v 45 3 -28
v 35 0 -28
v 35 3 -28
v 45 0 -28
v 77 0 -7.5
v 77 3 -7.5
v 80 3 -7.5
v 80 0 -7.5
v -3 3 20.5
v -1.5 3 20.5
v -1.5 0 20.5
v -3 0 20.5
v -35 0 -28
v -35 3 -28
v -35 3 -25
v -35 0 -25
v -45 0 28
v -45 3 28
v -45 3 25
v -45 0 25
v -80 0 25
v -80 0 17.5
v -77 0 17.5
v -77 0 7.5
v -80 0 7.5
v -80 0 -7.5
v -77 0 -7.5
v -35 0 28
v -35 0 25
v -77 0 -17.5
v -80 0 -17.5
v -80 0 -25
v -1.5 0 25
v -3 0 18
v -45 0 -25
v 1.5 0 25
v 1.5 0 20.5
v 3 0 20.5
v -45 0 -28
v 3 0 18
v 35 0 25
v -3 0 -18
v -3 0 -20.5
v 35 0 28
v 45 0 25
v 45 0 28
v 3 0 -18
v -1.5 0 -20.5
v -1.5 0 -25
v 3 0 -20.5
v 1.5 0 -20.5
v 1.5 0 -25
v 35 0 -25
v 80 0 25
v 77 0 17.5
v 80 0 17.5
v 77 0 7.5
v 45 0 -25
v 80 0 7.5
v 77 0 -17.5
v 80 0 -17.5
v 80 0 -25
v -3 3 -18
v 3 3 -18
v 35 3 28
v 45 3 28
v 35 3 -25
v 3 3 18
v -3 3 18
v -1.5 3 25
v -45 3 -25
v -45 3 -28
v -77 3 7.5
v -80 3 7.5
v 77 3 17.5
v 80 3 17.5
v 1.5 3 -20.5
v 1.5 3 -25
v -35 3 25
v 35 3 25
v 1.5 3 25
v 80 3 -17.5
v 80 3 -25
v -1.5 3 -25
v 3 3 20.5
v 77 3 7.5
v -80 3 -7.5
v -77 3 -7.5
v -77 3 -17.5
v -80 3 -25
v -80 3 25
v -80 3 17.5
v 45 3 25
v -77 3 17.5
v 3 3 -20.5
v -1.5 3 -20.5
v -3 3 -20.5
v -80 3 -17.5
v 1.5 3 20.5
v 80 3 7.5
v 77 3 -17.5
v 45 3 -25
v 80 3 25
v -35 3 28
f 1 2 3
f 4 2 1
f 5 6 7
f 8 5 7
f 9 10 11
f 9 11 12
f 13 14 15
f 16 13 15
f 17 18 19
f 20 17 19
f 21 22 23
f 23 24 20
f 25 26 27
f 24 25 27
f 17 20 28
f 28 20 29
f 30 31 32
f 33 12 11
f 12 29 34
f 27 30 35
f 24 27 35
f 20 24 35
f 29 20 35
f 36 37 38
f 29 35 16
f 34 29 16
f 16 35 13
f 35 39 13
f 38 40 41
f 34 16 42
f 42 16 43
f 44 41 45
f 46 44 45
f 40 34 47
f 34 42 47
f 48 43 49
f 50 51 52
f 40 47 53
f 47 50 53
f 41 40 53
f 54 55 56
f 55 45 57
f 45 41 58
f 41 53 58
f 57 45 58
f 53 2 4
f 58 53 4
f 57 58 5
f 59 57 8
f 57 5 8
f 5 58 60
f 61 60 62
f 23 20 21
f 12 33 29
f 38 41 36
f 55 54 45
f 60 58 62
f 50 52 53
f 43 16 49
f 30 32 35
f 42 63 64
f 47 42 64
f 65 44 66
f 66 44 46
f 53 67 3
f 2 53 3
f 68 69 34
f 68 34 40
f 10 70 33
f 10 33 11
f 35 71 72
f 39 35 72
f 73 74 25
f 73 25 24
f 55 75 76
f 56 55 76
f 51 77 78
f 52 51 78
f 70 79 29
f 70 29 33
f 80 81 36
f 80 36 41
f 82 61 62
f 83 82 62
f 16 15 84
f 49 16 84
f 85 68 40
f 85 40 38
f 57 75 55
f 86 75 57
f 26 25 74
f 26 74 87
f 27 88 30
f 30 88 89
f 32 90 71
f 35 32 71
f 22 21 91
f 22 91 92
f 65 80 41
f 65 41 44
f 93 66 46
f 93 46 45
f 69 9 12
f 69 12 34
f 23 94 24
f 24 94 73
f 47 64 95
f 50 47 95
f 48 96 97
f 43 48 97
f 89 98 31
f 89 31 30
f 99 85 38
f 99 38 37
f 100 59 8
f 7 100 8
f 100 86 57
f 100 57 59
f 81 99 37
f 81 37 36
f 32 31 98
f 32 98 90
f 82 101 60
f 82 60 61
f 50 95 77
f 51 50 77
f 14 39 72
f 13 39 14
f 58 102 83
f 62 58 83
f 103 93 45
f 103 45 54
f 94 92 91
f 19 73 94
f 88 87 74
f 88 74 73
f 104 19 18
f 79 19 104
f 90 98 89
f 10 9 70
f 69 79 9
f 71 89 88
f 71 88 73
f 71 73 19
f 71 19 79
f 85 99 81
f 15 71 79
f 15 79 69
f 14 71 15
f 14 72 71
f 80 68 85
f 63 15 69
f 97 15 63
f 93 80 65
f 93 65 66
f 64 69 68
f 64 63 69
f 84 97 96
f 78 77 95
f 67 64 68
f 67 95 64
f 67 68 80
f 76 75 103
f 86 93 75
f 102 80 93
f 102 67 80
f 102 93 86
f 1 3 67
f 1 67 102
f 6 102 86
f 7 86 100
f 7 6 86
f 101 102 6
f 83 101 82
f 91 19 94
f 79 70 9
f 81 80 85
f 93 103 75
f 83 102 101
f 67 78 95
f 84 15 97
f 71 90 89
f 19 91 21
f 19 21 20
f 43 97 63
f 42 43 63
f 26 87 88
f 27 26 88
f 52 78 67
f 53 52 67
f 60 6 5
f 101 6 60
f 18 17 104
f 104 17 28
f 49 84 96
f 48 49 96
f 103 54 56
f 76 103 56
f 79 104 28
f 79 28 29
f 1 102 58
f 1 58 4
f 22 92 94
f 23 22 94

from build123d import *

# Parameters (mm, degrees)
SKETCH3_W           = 160
SKETCH3_H           = 56
BOSS_EXTRUDE1_DEPTH = 3
SKETCH4_W           = 3
SKETCH4_H           = 10
SKETCH4_W_2         = 35
SKETCH4_H_2         = 3
CUT_EXTRUDE1_DEPTH  = 85.811555816


with BuildPart() as part:
    # Sketch3 → Boss-Extrude1 (new body)
    with BuildSketch(Plane(origin=(0, 0, 0), x_dir=(1, 0, 0), z_dir=(0, 1, 0))):
        Rectangle(SKETCH3_W, SKETCH3_H)
    extrude(amount=BOSS_EXTRUDE1_DEPTH)

    # Sketch4 → Cut-Extrude1 (cut, through all)
    with BuildSketch(Plane(origin=(0, 3, 0), x_dir=(1, 0, 0), z_dir=(0, 1, 0))):
        with Locations((-78.5, 12.5)):
            Rectangle(SKETCH4_W, SKETCH4_H)
        Polygon((-35, 28), (-35, 25), (-1.5, 25), (-1.5, 20.5), (-3, 20.5), (-3, 18), (3, 18), (3, 20.5), (1.5, 20.5), (1.5, 25), (35, 25), (35, 28), align=None)
        with Locations((-62.5, 26.5)):
            Rectangle(SKETCH4_W_2, SKETCH4_H_2)
        with Locations((62.5, 26.5)):
            Rectangle(SKETCH4_W_2, SKETCH4_H_2)
        with Locations((78.5, 12.5)):
            Rectangle(SKETCH4_W, SKETCH4_H)
        with Locations((78.5, -12.5)):
            Rectangle(SKETCH4_W, SKETCH4_H)
        with Locations((62.5, -26.5)):
            Rectangle(SKETCH4_W_2, SKETCH4_H_2)
        Polygon((35, -28), (-35, -28), (-35, -25), (-1.5, -25), (-1.5, -20.5), (-3, -20.5), (-3, -18), (3, -18), (3, -20.5), (1.5, -20.5), (1.5, -25), (35, -25), align=None)
        with Locations((-62.5, -26.5)):
            Rectangle(SKETCH4_W_2, SKETCH4_H_2)
        with Locations((-78.5, -12.5)):
            Rectangle(SKETCH4_W, SKETCH4_H)
    extrude(amount=-CUT_EXTRUDE1_DEPTH, mode=Mode.SUBTRACT)


solid = part.part
